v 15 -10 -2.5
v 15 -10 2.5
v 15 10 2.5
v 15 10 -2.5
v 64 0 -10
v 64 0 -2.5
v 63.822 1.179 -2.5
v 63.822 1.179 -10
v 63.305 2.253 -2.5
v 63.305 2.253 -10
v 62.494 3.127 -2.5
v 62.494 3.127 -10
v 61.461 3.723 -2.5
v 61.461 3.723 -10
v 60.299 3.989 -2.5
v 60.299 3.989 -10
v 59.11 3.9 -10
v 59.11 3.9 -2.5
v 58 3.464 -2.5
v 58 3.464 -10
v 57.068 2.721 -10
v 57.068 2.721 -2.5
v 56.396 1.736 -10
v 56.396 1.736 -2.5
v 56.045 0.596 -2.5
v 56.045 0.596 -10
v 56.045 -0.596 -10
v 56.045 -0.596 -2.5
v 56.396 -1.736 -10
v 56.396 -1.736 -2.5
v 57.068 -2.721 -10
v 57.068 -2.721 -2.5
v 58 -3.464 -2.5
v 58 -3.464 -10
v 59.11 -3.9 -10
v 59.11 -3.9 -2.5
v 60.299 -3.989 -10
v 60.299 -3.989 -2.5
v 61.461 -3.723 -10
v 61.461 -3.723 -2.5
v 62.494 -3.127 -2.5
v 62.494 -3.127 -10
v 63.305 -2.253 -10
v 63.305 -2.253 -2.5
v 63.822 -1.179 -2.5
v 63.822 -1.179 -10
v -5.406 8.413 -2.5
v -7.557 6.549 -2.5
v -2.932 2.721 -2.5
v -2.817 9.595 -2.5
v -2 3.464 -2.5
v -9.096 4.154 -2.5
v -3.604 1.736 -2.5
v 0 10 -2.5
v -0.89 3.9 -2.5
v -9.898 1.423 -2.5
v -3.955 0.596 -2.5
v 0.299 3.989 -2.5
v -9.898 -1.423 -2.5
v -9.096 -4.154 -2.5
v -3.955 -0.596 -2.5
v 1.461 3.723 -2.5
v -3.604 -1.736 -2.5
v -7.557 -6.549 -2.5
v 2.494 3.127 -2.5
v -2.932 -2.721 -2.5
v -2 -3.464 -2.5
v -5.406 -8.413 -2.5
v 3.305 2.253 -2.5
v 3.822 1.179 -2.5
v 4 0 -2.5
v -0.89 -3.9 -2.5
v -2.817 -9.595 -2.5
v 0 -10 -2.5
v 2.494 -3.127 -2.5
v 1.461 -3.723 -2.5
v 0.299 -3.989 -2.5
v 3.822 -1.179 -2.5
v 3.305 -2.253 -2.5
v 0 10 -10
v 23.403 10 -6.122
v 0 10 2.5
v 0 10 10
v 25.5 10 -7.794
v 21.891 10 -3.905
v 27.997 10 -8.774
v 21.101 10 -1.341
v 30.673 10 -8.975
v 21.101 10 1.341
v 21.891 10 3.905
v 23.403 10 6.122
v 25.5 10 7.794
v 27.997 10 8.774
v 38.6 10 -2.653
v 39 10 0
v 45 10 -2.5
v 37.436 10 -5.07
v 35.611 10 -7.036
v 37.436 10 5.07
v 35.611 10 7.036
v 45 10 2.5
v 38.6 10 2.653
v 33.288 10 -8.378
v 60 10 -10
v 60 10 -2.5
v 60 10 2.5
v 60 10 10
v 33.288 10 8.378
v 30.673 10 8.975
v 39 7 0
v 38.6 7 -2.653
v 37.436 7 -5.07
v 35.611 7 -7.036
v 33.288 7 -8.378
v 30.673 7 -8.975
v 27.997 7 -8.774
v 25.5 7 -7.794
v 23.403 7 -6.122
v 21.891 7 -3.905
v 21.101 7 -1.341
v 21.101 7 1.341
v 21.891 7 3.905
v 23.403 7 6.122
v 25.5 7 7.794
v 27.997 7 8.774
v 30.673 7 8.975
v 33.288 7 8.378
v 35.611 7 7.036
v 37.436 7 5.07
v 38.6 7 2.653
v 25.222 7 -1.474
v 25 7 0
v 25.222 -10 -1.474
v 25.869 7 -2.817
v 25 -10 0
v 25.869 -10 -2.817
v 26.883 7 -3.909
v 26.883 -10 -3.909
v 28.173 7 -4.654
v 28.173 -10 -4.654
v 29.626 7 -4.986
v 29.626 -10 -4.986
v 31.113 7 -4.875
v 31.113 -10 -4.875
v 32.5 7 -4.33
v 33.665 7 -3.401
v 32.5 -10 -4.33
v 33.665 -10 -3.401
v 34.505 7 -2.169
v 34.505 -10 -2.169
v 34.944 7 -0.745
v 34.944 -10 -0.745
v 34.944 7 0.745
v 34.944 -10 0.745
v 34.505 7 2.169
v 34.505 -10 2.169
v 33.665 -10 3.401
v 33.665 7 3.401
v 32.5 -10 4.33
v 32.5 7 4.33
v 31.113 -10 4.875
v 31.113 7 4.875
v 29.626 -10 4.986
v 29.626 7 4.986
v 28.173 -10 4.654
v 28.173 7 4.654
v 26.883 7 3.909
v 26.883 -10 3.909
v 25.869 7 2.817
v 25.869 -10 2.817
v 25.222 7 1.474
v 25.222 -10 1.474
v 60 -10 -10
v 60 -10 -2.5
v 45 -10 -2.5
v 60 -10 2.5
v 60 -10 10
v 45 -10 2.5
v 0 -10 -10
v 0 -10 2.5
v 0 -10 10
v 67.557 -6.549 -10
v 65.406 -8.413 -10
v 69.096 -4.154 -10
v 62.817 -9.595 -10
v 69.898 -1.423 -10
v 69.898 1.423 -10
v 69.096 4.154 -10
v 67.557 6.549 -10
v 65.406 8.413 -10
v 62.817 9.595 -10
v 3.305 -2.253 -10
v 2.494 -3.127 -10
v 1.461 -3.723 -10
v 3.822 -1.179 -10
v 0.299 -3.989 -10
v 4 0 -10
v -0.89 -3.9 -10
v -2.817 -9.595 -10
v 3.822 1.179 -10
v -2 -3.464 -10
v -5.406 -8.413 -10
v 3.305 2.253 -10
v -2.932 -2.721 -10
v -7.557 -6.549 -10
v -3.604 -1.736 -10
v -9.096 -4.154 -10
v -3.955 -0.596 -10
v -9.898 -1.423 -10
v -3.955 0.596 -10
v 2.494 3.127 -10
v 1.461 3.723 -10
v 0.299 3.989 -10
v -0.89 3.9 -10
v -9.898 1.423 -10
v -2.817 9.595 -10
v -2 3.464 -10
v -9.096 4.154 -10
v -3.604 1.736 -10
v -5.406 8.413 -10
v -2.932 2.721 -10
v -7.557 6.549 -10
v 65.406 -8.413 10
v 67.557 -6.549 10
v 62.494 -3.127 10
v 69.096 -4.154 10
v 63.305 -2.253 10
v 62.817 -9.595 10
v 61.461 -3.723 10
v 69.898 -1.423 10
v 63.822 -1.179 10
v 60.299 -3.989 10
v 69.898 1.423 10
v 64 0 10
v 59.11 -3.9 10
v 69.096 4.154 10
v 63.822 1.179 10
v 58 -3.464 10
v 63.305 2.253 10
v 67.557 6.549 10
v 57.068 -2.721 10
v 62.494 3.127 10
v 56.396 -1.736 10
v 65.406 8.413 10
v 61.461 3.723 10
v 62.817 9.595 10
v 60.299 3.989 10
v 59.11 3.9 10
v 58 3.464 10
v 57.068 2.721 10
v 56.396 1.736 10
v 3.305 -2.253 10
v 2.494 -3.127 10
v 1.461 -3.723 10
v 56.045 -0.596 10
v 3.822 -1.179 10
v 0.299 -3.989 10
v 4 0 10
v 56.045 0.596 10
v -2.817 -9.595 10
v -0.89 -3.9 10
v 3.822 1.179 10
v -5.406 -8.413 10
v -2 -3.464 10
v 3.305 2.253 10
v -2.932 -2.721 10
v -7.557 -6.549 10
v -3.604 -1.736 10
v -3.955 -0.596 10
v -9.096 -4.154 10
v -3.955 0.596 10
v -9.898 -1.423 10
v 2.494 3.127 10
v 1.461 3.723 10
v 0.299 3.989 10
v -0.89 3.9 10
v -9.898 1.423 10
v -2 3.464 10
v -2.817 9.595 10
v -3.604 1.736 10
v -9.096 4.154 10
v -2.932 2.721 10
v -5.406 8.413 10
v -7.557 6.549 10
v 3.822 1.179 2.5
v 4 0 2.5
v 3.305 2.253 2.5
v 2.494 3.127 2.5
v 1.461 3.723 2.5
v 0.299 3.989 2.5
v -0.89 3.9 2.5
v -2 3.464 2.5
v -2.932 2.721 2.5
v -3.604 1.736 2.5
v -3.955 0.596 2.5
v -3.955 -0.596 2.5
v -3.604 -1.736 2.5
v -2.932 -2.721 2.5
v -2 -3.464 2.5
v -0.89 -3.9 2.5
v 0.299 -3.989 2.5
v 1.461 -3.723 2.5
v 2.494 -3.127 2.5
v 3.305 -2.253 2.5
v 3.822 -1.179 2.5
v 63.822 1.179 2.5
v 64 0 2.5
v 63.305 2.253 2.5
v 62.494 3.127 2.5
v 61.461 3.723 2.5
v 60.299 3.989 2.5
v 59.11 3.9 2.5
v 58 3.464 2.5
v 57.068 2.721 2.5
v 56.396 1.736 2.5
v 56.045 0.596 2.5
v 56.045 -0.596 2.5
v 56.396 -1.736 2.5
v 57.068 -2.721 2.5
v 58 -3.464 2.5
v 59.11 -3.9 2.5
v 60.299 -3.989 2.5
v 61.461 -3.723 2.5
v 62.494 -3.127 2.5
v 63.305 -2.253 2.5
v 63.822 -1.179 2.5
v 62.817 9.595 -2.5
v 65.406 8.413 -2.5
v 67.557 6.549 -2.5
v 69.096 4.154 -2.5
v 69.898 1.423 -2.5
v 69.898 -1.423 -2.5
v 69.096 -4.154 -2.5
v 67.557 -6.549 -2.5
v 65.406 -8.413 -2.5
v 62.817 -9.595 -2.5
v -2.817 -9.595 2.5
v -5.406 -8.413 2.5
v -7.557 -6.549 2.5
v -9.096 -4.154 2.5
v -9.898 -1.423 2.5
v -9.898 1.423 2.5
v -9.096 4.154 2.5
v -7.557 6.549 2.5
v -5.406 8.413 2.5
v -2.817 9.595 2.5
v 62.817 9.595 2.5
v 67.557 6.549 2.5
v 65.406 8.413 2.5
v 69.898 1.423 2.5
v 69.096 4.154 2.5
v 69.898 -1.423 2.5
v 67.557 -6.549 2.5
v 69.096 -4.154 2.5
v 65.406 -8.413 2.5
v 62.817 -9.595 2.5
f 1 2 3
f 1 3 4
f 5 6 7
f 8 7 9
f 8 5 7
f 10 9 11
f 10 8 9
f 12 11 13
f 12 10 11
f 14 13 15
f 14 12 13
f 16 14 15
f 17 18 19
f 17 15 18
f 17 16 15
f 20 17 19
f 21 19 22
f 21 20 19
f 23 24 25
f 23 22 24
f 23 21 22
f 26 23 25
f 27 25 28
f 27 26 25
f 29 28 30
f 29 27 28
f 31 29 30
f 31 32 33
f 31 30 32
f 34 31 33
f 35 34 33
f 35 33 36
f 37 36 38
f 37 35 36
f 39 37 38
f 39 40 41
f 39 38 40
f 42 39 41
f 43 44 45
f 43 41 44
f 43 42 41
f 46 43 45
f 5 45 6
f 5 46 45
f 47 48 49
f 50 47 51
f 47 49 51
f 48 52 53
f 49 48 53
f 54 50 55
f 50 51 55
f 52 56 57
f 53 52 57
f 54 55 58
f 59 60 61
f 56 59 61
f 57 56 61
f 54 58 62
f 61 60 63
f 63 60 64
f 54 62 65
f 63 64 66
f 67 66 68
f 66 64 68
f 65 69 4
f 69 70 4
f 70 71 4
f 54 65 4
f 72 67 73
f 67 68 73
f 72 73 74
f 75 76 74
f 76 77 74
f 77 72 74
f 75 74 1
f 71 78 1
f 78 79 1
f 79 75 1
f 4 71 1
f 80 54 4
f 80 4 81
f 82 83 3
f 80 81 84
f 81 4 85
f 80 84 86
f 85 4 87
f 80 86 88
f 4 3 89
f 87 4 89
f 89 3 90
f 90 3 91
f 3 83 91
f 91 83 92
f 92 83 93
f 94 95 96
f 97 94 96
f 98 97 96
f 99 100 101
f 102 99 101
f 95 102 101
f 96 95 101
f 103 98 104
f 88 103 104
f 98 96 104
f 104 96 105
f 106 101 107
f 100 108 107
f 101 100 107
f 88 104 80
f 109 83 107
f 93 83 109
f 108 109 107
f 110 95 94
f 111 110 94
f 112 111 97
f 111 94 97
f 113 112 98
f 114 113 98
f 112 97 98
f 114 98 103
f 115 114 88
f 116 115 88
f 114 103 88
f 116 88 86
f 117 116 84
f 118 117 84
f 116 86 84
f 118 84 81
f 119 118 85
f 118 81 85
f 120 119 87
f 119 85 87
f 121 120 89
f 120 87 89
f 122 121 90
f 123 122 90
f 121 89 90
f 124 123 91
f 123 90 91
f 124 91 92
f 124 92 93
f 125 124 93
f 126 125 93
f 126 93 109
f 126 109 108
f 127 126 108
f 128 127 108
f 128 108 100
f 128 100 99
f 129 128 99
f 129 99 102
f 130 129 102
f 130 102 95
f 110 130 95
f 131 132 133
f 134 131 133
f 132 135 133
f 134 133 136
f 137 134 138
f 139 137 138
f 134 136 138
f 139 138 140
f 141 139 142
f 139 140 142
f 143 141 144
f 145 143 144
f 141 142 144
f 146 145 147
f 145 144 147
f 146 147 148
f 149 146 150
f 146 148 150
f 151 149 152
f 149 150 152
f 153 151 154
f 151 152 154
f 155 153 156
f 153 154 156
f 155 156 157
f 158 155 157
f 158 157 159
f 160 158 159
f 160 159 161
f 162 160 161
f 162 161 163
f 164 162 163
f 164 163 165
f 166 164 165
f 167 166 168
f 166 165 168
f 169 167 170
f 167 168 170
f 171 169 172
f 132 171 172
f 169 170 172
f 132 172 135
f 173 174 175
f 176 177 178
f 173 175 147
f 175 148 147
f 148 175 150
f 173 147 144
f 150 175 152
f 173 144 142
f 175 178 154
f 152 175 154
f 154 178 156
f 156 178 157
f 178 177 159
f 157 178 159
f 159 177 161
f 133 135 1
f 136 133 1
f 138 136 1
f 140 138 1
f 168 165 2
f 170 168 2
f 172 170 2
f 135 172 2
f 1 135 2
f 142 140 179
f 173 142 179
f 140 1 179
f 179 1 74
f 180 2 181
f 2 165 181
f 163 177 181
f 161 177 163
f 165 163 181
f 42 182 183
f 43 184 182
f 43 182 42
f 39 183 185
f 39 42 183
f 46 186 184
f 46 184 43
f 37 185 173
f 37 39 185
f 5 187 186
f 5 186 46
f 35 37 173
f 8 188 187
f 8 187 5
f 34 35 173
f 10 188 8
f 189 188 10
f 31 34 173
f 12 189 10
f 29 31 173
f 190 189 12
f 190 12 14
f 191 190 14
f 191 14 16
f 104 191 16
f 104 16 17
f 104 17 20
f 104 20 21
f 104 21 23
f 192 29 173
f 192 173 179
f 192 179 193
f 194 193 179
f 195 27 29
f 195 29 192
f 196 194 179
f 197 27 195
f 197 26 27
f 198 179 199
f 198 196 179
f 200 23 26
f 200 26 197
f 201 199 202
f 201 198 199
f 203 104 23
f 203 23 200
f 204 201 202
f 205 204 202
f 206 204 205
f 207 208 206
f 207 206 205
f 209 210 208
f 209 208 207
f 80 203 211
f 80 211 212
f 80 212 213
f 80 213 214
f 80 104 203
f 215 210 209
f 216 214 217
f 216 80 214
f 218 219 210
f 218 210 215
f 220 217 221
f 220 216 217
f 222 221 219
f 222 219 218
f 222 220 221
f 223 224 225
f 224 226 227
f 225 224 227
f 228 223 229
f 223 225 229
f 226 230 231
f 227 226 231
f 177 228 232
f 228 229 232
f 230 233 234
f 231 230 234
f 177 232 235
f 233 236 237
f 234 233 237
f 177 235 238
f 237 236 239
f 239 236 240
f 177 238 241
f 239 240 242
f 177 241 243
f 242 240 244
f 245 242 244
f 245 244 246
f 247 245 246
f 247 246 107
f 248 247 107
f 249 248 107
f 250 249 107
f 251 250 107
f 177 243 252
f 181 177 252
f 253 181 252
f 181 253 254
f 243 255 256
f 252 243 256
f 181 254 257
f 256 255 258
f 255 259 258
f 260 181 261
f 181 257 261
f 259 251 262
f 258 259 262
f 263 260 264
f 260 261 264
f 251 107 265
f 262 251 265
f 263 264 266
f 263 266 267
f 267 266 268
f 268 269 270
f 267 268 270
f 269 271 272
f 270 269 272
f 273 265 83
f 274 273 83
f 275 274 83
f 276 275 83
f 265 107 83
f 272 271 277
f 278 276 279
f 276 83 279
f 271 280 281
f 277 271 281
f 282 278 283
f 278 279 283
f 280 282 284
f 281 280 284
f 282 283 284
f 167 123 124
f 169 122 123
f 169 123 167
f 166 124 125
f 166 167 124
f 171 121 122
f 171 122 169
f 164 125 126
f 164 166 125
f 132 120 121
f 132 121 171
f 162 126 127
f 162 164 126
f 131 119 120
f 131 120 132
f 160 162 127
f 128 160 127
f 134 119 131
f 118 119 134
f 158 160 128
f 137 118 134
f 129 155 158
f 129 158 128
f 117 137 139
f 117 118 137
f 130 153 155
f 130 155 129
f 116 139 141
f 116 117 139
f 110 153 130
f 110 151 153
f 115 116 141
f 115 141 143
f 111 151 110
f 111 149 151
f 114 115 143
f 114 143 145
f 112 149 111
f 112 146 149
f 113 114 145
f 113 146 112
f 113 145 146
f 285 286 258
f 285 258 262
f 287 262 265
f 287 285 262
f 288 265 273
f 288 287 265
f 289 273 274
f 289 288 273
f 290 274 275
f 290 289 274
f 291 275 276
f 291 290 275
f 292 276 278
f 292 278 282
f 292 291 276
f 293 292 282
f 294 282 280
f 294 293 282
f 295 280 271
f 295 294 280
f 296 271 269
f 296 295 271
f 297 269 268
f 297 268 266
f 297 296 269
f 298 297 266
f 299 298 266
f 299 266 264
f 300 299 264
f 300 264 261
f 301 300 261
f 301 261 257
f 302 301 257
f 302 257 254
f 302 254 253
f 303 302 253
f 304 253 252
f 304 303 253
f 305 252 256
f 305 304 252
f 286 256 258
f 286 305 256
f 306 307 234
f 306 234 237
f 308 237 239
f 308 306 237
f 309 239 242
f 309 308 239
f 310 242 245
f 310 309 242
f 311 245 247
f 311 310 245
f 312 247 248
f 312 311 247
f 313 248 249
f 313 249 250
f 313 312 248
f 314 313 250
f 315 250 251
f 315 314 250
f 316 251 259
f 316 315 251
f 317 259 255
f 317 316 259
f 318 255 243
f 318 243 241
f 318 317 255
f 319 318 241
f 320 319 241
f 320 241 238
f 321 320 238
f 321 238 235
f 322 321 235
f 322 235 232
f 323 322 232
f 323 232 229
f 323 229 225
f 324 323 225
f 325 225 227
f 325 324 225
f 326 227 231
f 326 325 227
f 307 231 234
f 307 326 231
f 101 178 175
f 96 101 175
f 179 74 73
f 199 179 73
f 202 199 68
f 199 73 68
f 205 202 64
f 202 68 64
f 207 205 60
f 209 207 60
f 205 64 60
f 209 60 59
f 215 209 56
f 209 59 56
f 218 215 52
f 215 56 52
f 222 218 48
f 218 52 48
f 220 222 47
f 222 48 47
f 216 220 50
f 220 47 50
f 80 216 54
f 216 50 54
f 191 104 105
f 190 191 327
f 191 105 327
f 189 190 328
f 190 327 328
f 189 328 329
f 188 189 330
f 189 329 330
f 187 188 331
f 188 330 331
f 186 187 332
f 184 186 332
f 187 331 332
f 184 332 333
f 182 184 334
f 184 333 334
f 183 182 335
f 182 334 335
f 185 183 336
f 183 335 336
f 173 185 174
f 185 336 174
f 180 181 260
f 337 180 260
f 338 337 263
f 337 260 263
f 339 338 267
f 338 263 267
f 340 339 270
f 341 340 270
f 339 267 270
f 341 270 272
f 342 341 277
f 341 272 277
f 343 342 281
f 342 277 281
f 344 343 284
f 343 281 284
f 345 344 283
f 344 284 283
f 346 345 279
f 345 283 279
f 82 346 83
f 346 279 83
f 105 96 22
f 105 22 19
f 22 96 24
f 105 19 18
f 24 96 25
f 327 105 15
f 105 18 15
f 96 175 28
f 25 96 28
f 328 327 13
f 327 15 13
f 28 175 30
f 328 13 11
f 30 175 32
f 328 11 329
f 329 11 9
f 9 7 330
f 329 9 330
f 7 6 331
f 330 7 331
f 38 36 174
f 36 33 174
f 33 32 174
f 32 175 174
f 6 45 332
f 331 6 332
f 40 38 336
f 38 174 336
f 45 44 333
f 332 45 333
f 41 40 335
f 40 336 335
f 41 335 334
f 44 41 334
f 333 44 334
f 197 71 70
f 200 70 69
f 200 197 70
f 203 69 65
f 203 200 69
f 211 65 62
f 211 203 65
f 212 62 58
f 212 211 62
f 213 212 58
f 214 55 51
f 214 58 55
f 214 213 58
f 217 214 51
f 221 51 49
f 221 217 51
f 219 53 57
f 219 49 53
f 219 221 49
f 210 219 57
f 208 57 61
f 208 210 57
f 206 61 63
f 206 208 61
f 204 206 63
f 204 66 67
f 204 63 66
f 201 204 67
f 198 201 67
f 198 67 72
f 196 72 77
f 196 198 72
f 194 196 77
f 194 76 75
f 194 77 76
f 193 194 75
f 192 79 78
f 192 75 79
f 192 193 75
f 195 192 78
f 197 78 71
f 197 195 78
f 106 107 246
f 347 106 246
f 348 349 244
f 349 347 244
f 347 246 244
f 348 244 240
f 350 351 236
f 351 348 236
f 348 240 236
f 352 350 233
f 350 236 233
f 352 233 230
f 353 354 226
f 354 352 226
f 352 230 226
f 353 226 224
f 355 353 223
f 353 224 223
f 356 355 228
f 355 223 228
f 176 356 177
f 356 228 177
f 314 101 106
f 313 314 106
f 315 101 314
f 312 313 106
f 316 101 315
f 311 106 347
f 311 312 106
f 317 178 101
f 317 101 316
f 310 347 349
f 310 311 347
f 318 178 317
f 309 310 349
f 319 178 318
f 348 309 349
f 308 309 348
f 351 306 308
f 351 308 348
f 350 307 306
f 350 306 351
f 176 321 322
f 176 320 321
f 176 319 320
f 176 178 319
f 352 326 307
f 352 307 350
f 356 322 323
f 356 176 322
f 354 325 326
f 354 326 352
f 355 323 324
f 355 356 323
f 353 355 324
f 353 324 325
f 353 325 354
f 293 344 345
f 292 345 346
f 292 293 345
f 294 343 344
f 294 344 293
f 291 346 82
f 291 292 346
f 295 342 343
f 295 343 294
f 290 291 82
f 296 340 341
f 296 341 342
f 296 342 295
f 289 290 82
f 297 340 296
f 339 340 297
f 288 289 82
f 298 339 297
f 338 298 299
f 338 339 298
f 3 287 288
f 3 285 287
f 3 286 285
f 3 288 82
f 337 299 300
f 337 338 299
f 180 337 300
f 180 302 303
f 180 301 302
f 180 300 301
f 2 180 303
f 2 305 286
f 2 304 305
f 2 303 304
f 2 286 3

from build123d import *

# Parameters (mm, degrees)
SKETCH1_R               = 4
BOSS_EXTRUDE1_DEPTH     = 10
CUT_EXTRUDE2_DEPTH      = 72.414284285
CUT_EXTRUDE2_DEPTH_BACK = 72.414284285
SKETCH2_W               = 25
SKETCH2_H               = 5
HOLE1_D                 = 10
HOLE1_CBORE_D           = 18
HOLE1_CBORE_DEPTH       = 3


with BuildPart() as part:
    # Sketch1 → Boss-Extrude1 (new, symmetric)
    with BuildSketch(Plane.XY):
        with BuildLine():
            Line((0, 10), (60, 10))
            ThreePointArc((60, 10), (70, 0), (60, -10))
            Line((60, -10), (0, -10))
            ThreePointArc((0, -10), (-10, 0), (0, 10))
        make_face()
        Circle(SKETCH1_R, mode=Mode.SUBTRACT)
        with Locations((60, 0)):
            Circle(SKETCH1_R, mode=Mode.SUBTRACT)
    extrude(amount=BOSS_EXTRUDE1_DEPTH, both=True)

    # Sketch2 → Cut-Extrude2 (cut, two sides: drawn at the far end of the back side and taken through both)
    with BuildSketch(Plane(origin=(0, 0, 0), x_dir=(1, 0, 0), z_dir=(0, 1, 0)).offset(-CUT_EXTRUDE2_DEPTH_BACK)):
        with Locations((57.5, 0)):
            Rectangle(SKETCH2_W, SKETCH2_H)
        with Locations((2.5, 0)):
            Rectangle(SKETCH2_W, SKETCH2_H)
    extrude(amount=CUT_EXTRUDE2_DEPTH + CUT_EXTRUDE2_DEPTH_BACK, mode=Mode.SUBTRACT)

    # Hole1 (through all)
    with Locations(Plane(origin=(0, 10, 0), x_dir=(1, 0, 0), z_dir=(0, 1, 0))):
        with Locations((30, 0)):
            CounterBoreHole(HOLE1_D / 2, HOLE1_CBORE_D / 2, HOLE1_CBORE_DEPTH)


solid = part.part
